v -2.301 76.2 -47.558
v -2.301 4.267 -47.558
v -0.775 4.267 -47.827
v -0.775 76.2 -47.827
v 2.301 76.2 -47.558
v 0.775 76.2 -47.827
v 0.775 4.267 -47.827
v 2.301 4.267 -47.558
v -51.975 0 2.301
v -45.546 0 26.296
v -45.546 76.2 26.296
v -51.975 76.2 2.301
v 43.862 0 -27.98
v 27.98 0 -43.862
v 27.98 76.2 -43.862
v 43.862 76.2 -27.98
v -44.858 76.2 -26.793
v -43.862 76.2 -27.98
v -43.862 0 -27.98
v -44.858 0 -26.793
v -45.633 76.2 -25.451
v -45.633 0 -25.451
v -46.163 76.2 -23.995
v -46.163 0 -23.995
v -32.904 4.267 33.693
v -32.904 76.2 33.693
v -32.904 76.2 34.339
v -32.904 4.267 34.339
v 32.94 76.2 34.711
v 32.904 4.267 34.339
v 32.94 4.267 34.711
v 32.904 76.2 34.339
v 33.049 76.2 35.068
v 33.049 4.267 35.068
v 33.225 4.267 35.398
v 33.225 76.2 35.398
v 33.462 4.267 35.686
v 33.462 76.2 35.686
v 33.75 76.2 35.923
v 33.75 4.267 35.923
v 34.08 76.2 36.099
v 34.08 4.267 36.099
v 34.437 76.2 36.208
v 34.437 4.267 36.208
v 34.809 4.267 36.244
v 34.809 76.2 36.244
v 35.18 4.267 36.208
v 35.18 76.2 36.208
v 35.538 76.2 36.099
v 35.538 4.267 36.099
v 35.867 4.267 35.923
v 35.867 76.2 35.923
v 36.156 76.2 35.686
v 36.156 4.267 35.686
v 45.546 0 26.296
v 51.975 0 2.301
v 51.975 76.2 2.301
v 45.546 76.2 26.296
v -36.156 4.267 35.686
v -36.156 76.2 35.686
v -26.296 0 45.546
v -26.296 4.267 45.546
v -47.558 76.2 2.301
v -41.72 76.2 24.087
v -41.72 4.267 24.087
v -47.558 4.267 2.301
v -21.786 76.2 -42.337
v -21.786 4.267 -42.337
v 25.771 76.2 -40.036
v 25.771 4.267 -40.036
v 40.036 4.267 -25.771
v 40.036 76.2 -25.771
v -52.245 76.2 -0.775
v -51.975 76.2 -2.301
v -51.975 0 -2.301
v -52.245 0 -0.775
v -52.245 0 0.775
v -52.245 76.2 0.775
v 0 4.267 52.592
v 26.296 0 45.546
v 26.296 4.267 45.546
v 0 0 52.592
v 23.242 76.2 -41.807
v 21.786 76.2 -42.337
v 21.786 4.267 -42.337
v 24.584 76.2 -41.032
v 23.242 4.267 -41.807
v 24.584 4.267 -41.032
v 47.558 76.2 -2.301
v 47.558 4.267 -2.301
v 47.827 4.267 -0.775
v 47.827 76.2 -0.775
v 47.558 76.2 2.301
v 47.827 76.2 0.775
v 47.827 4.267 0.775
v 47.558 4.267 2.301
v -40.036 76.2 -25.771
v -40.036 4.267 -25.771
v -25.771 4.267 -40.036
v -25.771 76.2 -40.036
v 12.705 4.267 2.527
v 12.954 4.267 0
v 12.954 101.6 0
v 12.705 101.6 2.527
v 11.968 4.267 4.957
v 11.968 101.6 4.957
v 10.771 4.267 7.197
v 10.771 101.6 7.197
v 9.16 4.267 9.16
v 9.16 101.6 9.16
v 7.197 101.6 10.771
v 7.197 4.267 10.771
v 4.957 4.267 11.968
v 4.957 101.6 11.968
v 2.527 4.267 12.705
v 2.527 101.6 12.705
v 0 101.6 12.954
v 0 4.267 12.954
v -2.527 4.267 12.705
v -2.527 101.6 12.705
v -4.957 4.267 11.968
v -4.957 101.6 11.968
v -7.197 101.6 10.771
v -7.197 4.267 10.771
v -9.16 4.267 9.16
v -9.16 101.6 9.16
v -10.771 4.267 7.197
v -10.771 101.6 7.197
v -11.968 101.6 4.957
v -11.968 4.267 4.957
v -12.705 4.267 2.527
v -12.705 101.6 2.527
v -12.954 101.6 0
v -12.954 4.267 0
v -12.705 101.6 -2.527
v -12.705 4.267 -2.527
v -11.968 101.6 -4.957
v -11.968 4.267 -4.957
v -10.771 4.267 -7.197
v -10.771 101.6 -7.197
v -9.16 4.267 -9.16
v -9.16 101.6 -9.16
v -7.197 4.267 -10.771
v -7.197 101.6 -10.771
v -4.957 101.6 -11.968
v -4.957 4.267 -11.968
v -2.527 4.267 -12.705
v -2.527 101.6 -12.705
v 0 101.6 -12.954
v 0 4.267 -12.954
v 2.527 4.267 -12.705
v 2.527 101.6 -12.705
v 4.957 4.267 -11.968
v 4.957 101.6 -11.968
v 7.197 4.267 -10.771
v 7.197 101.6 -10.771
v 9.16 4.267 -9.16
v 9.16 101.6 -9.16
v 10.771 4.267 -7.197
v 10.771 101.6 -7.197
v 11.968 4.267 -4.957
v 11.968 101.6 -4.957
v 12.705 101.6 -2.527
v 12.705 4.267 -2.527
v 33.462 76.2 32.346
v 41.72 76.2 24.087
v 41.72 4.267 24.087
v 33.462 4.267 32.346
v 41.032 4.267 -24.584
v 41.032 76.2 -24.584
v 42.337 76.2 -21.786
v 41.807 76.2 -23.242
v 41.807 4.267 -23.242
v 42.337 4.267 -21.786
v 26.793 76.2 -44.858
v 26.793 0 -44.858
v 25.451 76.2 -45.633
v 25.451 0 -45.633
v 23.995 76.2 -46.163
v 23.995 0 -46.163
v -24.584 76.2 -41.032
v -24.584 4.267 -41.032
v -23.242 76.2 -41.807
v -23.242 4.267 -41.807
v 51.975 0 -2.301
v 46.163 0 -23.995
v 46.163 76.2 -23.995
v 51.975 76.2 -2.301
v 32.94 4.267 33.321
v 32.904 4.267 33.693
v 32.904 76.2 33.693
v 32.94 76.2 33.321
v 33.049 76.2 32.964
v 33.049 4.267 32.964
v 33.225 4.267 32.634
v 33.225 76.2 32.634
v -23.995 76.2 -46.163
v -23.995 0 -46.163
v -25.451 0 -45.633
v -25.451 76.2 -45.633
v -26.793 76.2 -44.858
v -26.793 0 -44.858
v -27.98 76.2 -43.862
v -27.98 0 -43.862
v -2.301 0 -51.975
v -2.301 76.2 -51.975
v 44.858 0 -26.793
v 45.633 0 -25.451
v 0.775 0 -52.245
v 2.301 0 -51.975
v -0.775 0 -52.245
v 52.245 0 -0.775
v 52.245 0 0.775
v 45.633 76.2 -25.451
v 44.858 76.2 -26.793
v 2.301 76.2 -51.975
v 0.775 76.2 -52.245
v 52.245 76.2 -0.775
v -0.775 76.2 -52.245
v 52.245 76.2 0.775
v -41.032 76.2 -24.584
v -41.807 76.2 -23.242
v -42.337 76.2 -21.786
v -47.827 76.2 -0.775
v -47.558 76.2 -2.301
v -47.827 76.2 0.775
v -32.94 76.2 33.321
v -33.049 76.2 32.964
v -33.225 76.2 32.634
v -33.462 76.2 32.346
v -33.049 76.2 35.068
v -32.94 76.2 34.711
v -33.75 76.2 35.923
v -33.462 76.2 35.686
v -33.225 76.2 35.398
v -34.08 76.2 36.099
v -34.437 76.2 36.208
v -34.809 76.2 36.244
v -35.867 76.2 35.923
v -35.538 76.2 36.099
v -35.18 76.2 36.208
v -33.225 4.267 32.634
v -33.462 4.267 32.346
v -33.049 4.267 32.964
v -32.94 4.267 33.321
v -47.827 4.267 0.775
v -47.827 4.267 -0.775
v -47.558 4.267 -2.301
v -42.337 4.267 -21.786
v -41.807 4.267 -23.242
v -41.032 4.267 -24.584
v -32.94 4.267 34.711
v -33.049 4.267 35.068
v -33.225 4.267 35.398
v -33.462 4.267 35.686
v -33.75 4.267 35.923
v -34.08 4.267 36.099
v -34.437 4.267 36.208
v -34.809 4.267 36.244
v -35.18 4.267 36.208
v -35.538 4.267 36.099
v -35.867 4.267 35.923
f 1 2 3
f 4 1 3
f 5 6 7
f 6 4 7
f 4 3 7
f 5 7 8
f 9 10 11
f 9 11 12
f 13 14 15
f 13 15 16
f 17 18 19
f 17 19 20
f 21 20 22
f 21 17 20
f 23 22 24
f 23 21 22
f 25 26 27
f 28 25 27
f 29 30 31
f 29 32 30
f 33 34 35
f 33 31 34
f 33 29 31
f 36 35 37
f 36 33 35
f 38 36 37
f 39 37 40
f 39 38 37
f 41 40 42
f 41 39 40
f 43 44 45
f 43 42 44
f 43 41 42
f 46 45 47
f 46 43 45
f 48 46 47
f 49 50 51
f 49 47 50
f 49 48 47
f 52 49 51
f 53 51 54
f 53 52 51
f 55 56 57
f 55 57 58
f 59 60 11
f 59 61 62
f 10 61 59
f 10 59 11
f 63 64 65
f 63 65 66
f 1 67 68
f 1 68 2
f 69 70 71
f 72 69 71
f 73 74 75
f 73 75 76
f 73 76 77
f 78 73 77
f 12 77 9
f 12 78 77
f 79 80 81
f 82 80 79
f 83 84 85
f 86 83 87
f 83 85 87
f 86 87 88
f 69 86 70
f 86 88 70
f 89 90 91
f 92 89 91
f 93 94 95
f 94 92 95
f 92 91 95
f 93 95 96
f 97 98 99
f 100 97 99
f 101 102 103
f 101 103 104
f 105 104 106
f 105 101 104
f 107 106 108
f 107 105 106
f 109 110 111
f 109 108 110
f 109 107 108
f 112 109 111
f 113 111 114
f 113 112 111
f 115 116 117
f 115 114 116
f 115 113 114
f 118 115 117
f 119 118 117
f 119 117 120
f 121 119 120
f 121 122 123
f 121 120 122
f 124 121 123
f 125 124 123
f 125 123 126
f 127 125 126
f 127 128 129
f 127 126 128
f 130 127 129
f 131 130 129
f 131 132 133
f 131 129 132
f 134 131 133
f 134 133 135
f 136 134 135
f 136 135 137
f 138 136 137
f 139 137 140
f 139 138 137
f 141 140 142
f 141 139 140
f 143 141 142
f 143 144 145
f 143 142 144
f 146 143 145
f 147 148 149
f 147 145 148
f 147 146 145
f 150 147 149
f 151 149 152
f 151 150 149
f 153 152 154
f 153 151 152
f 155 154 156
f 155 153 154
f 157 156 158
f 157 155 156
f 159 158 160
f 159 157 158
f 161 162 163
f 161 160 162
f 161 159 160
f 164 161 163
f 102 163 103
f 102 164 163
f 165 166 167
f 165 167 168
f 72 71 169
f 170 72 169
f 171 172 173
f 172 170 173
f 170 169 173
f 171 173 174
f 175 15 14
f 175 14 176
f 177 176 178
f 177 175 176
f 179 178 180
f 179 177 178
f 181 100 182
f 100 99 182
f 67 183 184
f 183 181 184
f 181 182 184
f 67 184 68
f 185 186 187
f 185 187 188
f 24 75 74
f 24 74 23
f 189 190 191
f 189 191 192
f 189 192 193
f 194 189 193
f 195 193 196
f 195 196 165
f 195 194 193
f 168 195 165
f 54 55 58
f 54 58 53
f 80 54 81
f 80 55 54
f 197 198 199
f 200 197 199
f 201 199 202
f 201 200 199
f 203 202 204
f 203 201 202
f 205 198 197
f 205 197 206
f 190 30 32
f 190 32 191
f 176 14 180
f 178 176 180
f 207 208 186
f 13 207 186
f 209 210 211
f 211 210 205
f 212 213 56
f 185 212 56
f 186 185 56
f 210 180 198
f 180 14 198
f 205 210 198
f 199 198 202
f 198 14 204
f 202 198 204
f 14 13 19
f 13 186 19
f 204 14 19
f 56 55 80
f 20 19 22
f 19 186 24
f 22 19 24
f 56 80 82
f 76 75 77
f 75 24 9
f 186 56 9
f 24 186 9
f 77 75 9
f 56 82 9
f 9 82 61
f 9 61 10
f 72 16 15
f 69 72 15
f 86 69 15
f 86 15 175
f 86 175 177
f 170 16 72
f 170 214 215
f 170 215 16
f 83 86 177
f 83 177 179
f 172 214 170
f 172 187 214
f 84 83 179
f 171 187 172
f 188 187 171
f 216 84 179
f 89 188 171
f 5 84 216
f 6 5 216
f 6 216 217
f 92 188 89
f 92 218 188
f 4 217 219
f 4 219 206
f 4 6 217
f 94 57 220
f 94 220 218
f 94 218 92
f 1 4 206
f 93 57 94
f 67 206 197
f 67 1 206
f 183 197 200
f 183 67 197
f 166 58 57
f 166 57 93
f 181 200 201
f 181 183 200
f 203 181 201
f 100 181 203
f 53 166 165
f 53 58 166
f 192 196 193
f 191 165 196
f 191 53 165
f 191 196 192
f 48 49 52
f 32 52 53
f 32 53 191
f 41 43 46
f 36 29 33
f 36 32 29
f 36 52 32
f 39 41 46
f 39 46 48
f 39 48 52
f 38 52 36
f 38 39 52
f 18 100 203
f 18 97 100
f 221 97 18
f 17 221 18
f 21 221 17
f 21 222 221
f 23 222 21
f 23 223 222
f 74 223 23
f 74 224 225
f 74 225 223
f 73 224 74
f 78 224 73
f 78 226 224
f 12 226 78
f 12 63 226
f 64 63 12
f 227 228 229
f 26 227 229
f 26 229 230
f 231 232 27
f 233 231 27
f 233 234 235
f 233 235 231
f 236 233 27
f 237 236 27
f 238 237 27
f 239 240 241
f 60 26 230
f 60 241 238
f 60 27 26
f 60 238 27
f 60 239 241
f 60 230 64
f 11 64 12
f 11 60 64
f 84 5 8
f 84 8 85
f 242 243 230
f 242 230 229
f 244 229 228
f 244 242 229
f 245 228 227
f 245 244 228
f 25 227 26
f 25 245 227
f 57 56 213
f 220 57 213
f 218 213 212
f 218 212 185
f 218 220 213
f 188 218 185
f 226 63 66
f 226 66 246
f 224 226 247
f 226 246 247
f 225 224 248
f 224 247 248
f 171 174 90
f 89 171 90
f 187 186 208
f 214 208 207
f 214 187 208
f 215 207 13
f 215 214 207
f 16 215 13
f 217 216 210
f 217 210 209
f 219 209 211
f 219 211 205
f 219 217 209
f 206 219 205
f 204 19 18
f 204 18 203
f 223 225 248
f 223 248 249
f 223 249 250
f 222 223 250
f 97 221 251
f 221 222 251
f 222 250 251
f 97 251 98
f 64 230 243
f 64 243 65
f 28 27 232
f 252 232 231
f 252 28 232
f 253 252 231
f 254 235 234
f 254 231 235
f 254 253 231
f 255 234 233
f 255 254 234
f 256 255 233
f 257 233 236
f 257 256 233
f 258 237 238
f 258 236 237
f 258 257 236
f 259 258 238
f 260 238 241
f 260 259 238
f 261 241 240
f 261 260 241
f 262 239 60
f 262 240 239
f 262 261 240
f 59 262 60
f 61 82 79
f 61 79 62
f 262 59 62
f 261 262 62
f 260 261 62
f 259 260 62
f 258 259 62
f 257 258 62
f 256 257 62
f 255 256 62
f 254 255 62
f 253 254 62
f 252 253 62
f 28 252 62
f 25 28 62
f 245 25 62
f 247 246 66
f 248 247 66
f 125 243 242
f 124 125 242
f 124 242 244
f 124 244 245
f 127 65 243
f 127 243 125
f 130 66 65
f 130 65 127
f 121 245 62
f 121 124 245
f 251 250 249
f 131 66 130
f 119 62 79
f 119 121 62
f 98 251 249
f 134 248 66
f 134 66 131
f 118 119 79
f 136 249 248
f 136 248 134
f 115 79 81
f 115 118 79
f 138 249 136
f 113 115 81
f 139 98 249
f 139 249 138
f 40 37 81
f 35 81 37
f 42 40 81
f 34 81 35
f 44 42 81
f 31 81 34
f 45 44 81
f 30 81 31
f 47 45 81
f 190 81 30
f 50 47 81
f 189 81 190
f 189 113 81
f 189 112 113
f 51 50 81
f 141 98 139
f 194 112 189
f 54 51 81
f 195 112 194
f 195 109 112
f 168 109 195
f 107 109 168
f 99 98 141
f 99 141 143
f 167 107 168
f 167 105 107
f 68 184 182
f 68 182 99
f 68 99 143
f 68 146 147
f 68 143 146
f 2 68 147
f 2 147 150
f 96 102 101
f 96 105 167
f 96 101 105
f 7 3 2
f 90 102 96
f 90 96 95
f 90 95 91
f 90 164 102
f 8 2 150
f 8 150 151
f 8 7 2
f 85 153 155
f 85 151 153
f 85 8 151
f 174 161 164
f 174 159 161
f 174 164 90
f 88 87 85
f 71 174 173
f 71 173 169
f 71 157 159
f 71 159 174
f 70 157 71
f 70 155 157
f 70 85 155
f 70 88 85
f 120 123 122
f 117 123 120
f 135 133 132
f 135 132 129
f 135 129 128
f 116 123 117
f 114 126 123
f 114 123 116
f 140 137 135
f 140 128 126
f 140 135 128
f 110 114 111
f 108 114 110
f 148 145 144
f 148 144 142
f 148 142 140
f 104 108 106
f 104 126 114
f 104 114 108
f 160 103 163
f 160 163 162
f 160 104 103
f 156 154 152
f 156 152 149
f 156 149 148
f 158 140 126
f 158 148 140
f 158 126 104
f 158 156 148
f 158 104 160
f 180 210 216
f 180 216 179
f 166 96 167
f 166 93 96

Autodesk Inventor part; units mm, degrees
ref_plane "YZ Plane" through (0, 0, 0) normal (1, 0, 0) x (0, 1, 0)
ref_plane "XZ Plane" through (0, 0, 0) normal (0, 1, 0) x (-1, 0, 0)
ref_plane "XY Plane" through (0, 0, 0) normal (0, 0, 1) x (1, 0, 0)
sketch "Sketch1" plane through (0, 0, 0) normal (0, 1, 0) x (-1, 0, 0)
  line L0 (52.592, 0) -> (45.546, -26.296)
  line L1 (45.546, -26.296) -> (26.296, -45.546)
  line L2 (26.296, -45.546) -> (0, -52.592)
  line L3 (0, -52.592) -> (-26.296, -45.546)
  line L4 (-26.296, -45.546) -> (-45.546, -26.296)
  line L5 (-45.546, -26.296) -> (-52.592, 0)
  line L6 (-52.592, 0) -> (-45.546, 26.296)
  line L7 (-45.546, 26.296) -> (-26.296, 45.546)
  line L8 (-26.296, 45.546) -> (0, 52.592)
  line L9 (0, 52.592) -> (26.296, 45.546)
  line L10 (26.296, 45.546) -> (45.546, 26.296)
  line L11 (45.546, 26.296) -> (52.592, 0)
  point P0 (0, 0)
  point P1 (0, 0)
  dimension "d0" = 50.8
extrude "Extrusion1" add sketch "Sketch1" along normal blind 76.2
sketch "Sketch2" plane through (0, 76.2, 0) normal (0, 1, 0) x (1, 0, 0)
  line L0 (-48.1743, 0) -> (-41.7202, 24.0871)
  line L1 (-41.7202, 24.0871) -> (-24.0871, 41.7202)
  line L2 (-24.0871, 41.7202) -> (0, 48.1743)
  line L3 (0, 48.1743) -> (24.0871, 41.7202)
  line L4 (24.0871, 41.7202) -> (41.7202, 24.0871)
  line L5 (41.7202, 24.0871) -> (48.1743, 0)
  line L6 (48.1743, 0) -> (41.7202, -24.0871)
  line L7 (41.7202, -24.0871) -> (32.9037, -32.9037)
  line L8 (-32.9037, -32.9037) -> (-41.7202, -24.0871)
  line L9 (-41.7202, -24.0871) -> (-48.1743, 0)
  line L10 (-52.592, 0) -> (-45.546, -26.296) projected
  line L11 (-32.9037, -32.9037) -> (-32.9037, -66.8246)
  line L12 (-32.9037, -66.8246) -> (32.9037, -66.8246)
  line L13 (32.9037, -66.8246) -> (32.9037, -32.9037)
  point P0 (0, 0)
  point P1 (0, 0)
  dimension "d3" = 4.2672
extrude "Extrusion2" cut sketch "Sketch2" against normal blind 71.9328
fillet "Fillet1" radius 1.905 4 edges at (-32.9037, 40.2336, 38.9384) (-32.9037, 40.2336, 32.9037) (32.9037, 40.2336, 38.9384) (32.9037, 40.2336, 32.9037)
sketch "Sketch3" plane through (0, 4.2672, 0) normal (0, 1, 0) x (1, 0, 0)
  circle A0 centre (0, 0) radius 12.954
  dimension "d7" = 25.908
extrude "Extrusion3" add sketch "Sketch3" along normal blind 97.3328
fillet "Fillet2" radius 8.89 14 edges at (52.592, 38.1, 0) (45.546, 38.1, -26.296) (26.296, 38.1, -45.546) (0, 38.1, -52.592) (-26.296, 38.1, -45.546) (-45.546, 38.1, -26.296) (-52.592, 38.1, 0) (-48.1743, 40.2336, 0) (-41.7202, 40.2336, -24.0871) (-24.0871, 40.2336, -41.7202) (0, 40.2336, -48.1743) (24.0871, 40.2336, -41.7202) (41.7202, 40.2336, -24.0871) (48.1743, 40.2336, 0)
properties part number "holder-12"
